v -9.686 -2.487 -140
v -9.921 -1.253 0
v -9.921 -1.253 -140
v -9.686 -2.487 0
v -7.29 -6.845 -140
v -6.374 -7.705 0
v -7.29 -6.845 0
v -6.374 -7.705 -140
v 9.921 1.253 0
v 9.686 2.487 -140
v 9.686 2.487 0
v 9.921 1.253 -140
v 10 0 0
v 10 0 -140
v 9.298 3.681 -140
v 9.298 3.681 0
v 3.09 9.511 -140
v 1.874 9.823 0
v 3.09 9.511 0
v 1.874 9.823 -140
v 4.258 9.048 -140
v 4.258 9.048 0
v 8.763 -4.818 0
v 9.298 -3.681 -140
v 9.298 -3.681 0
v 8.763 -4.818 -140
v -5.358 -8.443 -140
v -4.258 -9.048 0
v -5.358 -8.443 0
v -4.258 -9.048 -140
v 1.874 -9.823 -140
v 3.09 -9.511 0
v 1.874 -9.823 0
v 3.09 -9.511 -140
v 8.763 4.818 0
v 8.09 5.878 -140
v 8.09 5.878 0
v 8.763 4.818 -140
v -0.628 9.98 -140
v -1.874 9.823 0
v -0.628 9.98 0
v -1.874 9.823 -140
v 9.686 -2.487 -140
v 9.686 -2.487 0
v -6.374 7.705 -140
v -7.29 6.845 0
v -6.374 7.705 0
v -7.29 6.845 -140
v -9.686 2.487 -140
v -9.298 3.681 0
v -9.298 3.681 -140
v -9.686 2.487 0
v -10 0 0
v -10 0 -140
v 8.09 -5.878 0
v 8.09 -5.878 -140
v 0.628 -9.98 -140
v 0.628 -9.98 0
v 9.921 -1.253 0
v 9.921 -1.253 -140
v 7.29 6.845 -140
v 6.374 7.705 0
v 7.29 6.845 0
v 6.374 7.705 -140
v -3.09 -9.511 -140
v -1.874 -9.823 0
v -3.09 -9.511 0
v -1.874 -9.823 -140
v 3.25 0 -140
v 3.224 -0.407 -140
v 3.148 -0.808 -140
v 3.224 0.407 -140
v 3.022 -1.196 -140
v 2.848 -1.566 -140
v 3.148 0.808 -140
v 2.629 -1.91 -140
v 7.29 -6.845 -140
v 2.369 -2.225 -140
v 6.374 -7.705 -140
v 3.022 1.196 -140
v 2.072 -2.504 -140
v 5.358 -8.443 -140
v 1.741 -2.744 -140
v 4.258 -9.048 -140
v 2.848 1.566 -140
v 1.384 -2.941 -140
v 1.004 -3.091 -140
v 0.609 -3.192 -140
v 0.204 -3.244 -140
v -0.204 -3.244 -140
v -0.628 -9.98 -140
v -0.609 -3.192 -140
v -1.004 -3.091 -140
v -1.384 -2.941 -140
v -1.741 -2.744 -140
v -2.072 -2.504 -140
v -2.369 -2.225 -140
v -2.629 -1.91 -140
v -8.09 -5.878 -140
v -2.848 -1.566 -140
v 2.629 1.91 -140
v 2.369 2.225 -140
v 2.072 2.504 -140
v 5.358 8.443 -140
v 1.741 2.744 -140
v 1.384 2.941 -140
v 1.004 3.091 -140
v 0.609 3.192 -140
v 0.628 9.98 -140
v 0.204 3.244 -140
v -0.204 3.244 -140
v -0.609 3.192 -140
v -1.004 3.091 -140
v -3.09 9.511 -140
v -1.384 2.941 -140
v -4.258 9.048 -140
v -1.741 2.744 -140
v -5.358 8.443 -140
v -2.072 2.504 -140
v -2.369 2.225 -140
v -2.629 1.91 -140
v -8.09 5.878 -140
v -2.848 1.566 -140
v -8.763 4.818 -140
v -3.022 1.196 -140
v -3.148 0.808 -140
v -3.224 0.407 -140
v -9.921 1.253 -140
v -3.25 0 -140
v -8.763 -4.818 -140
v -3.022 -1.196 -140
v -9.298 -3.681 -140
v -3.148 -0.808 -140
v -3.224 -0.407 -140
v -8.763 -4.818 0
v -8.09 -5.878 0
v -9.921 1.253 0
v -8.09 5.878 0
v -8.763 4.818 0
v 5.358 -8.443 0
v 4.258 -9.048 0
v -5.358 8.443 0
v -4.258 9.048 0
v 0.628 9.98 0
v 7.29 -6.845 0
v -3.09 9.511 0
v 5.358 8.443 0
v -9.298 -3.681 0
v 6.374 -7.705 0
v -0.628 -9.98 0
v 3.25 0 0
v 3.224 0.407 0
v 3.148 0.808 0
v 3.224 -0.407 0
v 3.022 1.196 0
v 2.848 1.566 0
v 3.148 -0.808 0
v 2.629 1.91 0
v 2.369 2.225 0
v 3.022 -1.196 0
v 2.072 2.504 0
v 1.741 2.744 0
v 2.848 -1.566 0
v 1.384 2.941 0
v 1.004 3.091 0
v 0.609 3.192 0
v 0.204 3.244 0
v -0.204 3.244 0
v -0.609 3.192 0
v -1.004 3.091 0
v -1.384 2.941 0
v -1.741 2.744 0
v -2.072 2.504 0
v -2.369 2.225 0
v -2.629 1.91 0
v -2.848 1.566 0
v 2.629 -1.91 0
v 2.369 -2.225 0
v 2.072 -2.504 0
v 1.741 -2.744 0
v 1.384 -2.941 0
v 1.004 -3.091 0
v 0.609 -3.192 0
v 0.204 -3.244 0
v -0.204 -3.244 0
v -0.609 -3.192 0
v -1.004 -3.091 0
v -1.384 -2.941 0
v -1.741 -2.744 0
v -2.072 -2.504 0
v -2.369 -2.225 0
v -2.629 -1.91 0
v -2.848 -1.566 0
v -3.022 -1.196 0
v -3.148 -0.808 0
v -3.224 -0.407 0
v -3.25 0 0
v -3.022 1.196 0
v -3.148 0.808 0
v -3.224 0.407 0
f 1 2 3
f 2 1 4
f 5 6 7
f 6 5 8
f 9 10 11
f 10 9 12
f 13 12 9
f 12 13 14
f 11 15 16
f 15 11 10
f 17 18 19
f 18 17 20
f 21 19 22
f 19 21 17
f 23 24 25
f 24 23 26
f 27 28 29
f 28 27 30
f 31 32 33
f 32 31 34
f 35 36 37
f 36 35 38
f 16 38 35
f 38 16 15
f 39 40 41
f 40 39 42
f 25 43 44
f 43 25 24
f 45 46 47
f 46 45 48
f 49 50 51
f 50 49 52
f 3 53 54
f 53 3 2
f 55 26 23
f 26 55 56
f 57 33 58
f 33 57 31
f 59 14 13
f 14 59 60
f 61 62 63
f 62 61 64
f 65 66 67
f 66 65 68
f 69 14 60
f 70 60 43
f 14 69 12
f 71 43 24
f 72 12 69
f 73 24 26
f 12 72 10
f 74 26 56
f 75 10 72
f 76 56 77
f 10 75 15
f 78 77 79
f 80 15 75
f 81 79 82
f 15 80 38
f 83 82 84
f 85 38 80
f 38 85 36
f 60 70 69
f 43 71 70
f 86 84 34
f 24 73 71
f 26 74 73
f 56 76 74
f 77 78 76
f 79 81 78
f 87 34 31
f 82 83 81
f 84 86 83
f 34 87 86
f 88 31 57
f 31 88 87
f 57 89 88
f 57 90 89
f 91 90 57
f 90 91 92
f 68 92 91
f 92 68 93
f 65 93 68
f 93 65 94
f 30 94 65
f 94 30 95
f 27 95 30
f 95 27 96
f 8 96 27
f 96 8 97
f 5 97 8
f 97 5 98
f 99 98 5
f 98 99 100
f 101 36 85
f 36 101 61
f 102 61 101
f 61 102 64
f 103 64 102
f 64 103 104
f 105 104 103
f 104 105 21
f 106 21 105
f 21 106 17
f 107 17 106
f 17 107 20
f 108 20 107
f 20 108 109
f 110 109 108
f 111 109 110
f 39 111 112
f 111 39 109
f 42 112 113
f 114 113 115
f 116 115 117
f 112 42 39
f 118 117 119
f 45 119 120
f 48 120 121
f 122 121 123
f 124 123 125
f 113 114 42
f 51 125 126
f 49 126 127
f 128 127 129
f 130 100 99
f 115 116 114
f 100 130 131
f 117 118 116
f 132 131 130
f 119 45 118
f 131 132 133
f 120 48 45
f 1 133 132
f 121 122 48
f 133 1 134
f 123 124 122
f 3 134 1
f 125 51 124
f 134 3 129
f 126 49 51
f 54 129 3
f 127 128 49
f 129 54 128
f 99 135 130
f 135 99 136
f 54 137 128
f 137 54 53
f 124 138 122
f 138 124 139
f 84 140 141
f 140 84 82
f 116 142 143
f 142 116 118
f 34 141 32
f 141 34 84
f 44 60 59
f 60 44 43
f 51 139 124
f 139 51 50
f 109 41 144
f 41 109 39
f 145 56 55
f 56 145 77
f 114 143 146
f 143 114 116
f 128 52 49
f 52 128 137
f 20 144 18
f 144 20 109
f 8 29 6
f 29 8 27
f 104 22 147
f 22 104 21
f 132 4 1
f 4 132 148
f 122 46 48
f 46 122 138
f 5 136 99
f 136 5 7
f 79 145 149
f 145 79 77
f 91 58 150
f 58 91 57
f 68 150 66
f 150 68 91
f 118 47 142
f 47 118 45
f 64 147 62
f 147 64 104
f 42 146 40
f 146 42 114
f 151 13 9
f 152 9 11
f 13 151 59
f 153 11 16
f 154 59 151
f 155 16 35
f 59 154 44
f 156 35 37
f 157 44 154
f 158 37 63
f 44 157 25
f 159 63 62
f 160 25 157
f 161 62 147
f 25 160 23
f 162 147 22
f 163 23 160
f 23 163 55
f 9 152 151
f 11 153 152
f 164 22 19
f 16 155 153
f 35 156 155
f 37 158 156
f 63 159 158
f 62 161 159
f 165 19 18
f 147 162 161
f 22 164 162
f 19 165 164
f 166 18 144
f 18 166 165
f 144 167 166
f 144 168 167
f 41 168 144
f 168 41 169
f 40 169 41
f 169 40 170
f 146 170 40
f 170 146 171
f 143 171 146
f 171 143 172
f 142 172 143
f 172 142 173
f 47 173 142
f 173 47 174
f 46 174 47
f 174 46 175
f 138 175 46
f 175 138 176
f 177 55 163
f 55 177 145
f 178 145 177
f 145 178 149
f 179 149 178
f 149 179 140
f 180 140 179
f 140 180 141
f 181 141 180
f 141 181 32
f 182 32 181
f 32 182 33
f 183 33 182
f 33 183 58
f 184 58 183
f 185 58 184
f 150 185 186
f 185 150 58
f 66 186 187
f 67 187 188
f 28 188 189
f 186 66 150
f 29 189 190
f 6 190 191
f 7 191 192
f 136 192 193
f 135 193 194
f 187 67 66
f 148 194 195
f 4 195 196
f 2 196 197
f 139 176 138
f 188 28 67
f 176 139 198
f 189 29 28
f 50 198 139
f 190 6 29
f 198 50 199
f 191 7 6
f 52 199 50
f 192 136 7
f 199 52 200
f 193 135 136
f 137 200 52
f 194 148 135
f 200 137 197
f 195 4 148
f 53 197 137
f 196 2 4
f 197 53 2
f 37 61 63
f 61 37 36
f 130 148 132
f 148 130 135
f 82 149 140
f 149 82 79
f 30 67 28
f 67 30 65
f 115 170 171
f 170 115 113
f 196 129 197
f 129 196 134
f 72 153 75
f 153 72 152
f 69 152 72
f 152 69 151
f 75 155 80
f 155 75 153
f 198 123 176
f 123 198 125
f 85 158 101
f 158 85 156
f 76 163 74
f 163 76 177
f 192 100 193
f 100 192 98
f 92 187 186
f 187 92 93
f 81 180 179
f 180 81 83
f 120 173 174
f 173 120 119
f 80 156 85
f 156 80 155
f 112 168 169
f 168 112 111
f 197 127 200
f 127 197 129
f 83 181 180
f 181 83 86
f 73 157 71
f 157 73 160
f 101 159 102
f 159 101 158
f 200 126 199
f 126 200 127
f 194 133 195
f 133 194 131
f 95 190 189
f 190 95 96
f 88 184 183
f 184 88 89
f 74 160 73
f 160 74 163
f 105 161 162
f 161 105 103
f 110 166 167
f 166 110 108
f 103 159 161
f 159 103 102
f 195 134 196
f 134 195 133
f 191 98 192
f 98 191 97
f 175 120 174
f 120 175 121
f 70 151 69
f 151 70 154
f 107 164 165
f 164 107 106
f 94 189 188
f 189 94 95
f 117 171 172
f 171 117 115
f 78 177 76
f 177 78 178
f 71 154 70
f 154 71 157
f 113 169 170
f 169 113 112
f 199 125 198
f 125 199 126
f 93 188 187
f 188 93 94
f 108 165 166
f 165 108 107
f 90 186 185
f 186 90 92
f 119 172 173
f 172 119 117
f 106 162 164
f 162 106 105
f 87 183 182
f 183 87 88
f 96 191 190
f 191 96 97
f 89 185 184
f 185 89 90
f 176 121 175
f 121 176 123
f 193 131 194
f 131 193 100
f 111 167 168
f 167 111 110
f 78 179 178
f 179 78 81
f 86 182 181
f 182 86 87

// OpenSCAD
$fn = 50;


difference() {
	union() {
		translate(v = [0, 0, -140.0000000000]) {
			cylinder(h = 140, r = 10.0000000000);
		}
	}
	union() {
		#translate(v = [0, 0, -140]) {
			cylinder(h = 140, r = 3.2500000000);
		}
	}
}
